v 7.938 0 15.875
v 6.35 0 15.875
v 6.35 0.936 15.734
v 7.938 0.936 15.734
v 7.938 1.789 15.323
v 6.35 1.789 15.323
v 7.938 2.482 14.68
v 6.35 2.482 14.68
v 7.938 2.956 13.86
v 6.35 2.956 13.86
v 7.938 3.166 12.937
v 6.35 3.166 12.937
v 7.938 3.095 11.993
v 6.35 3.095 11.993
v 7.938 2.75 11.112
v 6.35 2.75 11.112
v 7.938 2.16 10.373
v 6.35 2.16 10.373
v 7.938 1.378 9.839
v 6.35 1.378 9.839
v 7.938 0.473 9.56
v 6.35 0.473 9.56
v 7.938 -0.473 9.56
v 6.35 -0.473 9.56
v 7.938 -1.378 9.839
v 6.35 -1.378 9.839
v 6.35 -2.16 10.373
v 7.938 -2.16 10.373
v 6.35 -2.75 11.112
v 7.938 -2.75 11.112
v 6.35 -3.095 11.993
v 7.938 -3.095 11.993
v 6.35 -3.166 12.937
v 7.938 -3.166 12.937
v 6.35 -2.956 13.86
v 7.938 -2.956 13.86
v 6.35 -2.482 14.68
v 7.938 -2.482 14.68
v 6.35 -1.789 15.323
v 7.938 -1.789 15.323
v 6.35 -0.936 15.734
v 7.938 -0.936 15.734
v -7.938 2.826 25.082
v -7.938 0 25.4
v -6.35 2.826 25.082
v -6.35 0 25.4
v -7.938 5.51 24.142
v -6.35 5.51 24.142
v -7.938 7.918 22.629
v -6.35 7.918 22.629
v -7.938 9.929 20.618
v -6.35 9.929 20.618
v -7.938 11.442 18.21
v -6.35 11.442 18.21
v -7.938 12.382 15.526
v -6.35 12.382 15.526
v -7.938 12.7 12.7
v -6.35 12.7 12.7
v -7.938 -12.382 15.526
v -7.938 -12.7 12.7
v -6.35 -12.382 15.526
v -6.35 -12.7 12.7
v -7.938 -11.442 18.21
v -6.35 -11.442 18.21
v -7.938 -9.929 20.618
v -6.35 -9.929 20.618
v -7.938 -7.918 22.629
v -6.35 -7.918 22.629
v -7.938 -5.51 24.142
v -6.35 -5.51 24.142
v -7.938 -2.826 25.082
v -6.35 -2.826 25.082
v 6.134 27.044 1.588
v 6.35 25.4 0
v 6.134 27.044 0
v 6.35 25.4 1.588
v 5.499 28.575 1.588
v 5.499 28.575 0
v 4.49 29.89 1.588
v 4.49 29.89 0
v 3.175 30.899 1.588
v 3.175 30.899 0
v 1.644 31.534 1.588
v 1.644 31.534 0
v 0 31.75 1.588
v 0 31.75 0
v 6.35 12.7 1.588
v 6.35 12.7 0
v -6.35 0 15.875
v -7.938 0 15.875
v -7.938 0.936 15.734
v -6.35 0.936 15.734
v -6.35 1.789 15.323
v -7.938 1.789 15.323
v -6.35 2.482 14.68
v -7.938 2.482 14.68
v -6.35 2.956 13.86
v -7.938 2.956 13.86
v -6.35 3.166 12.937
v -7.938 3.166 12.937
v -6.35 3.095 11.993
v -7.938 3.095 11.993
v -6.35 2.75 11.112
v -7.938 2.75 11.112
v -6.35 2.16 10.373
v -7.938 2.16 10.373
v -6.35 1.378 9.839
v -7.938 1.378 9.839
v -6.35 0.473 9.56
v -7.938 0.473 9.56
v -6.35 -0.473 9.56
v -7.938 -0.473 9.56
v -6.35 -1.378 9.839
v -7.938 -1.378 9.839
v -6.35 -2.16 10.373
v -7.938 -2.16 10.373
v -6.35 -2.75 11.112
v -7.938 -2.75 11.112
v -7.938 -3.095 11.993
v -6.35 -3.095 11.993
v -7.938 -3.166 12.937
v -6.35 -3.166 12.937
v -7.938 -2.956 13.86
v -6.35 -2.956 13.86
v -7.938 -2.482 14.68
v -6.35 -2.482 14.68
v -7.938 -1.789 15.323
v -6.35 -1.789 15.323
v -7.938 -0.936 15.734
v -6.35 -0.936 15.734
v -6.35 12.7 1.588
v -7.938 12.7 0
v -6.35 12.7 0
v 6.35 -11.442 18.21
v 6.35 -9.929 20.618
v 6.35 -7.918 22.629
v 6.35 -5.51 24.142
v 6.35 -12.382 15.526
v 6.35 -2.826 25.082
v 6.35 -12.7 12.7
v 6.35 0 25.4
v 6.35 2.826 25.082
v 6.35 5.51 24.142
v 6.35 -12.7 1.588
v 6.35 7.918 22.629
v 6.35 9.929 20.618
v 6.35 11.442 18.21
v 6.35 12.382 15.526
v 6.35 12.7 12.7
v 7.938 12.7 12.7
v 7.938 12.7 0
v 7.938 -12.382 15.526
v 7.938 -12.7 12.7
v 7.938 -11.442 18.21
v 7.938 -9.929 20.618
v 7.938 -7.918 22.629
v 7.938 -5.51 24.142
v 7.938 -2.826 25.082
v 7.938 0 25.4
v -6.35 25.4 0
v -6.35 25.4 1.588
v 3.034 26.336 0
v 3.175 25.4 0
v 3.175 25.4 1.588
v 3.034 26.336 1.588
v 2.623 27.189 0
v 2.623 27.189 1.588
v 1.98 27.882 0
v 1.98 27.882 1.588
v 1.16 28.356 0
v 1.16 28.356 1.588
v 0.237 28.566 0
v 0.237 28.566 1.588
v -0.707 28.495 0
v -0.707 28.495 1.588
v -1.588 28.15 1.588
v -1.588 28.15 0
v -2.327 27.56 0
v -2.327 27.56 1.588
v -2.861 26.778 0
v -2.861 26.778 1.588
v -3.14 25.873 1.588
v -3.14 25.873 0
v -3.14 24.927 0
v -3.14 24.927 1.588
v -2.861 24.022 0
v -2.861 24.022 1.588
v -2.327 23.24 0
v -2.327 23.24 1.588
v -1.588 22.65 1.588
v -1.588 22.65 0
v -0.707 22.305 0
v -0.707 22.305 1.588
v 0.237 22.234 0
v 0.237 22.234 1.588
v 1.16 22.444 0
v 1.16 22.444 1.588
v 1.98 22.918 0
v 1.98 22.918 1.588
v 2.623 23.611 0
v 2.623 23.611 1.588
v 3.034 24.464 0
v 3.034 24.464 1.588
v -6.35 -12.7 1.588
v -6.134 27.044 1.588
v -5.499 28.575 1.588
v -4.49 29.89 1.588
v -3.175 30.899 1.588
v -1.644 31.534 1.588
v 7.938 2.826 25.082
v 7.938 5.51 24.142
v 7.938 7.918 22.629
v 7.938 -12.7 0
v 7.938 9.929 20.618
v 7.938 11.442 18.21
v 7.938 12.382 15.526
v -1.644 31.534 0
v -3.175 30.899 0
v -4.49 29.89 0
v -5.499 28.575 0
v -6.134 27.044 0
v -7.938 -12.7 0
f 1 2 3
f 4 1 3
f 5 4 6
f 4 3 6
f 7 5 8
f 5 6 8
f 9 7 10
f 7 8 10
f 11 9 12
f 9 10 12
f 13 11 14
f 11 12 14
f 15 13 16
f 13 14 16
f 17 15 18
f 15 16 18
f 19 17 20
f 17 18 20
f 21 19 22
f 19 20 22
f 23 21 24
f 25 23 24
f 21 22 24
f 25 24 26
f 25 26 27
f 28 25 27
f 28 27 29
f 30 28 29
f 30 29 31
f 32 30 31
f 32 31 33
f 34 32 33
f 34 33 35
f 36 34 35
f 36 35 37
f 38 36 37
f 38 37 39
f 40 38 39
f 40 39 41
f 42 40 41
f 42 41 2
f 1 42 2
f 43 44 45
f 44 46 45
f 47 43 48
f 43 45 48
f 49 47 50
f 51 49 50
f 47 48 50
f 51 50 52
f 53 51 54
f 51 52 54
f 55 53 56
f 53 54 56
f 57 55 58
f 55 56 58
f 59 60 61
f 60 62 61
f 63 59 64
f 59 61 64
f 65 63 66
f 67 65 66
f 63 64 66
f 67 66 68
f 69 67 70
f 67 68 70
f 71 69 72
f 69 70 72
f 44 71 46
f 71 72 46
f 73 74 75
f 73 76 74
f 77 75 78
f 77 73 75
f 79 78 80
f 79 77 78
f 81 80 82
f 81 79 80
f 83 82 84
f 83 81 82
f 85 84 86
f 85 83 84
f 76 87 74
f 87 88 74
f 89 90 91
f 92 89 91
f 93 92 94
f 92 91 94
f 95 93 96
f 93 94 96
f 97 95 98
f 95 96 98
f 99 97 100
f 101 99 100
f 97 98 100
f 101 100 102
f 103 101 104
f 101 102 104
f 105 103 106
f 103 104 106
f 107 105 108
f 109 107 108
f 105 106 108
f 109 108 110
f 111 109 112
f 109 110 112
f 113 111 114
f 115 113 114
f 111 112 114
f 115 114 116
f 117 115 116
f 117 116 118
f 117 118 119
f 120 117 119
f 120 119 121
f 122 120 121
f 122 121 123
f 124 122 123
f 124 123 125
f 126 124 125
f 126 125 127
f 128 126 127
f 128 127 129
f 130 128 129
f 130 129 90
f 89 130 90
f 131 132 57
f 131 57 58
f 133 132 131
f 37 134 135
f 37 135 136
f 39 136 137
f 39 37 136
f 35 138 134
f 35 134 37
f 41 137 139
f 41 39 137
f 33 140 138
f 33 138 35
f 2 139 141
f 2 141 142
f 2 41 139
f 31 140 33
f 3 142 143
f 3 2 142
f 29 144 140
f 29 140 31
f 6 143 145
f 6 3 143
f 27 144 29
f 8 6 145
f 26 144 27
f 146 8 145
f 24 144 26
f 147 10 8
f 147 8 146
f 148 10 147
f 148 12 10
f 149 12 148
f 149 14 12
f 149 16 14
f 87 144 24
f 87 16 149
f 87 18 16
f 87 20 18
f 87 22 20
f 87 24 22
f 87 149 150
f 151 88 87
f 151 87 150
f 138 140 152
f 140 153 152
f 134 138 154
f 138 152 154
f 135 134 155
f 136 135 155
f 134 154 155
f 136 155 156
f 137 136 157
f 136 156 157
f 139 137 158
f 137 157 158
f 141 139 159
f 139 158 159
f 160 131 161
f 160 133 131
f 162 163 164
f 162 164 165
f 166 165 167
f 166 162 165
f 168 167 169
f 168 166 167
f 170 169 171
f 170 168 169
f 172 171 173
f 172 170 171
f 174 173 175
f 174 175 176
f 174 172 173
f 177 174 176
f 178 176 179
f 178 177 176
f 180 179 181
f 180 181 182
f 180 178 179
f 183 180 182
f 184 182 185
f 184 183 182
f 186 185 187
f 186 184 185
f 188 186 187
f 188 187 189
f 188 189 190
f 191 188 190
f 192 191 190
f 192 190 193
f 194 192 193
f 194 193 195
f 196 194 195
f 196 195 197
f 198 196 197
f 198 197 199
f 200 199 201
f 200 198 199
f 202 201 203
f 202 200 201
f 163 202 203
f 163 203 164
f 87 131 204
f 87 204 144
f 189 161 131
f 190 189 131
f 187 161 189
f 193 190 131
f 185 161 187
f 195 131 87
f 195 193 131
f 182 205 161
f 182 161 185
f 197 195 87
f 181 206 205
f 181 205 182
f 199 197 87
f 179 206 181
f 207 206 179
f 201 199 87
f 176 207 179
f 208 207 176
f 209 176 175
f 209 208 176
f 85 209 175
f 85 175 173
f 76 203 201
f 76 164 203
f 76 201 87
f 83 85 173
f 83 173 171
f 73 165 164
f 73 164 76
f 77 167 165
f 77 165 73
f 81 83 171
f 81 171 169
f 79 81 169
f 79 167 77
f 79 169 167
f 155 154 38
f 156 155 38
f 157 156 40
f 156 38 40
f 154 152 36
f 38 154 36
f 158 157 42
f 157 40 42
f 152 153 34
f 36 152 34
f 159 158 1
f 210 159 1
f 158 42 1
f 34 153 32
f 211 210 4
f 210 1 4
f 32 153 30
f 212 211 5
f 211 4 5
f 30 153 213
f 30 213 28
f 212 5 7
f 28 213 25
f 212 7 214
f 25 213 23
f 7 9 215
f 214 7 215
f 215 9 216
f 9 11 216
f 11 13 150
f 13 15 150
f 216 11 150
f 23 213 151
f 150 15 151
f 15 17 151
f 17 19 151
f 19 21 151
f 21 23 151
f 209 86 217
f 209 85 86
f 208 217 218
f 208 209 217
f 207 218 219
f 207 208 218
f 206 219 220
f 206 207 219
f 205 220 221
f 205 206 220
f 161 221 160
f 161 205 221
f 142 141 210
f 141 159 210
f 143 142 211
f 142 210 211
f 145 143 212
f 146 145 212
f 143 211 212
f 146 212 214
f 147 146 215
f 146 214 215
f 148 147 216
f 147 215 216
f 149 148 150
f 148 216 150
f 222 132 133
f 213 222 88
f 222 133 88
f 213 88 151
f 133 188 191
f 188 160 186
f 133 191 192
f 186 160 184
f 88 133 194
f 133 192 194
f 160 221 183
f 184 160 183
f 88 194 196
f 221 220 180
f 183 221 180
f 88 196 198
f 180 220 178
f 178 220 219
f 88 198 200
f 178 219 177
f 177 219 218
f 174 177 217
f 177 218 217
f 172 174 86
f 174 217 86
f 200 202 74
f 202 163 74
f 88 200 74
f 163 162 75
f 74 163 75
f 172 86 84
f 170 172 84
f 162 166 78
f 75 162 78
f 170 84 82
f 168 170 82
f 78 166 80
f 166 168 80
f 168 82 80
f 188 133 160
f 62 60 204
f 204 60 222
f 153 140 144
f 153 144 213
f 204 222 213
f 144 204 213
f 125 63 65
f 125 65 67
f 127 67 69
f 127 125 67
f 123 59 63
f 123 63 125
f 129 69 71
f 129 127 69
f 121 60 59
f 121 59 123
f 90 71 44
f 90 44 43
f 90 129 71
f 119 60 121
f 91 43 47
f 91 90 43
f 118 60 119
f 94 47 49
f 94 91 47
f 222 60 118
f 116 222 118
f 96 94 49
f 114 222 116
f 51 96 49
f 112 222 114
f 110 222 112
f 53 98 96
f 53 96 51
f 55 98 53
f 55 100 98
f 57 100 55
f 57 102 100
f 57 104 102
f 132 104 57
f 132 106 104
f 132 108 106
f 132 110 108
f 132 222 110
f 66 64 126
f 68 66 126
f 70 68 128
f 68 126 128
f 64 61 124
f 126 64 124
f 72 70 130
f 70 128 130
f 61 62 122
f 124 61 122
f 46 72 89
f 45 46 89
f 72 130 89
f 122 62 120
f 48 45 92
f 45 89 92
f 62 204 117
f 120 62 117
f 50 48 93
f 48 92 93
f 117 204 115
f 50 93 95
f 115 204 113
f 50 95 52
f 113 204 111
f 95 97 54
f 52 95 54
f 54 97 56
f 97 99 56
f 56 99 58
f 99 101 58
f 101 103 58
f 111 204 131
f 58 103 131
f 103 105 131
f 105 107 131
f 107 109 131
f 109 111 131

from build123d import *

# Parameters (mm, degrees)
SKETCH1_W           = 12.7
SKETCH1_H           = 25.4
SKETCH1_H_2         = 19.05
SKETCH1_R           = 3.175
BOSS_EXTRUDE1_DEPTH = 1.5875
SKETCH1_3_W         = 1.5875
SKETCH1_3_H         = 25.4
BOSS_EXTRUDE2_DEPTH = 25.4
SKETCH2_R           = 3.175
CUT_EXTRUDE1_DEPTH  = 44.649033494
FILLET1_R           = 12.7
FILLET2_R           = 6.35


with BuildPart() as part:
    # Sketch1 → Boss-Extrude1 (new body)
    # profile 1 of 2: a face of its own
    with BuildSketch(Plane.XY):
        Rectangle(SKETCH1_W, SKETCH1_H)
    # profile 2 of 2: a face of its own
    with BuildSketch(Plane.XY):
        with Locations((0, 22.225)):
            Rectangle(SKETCH1_W, SKETCH1_H_2)
        with Locations((0, 25.4)):
            Circle(SKETCH1_R, mode=Mode.SUBTRACT)
    extrude(amount=BOSS_EXTRUDE1_DEPTH)

    # Sketch1<3> → Boss-Extrude2 (add)
    with BuildSketch(Plane.XY):
        with Locations((-7.14375, 0)):
            Rectangle(SKETCH1_3_W, SKETCH1_3_H)
        with Locations((7.14375, 0)):
            Rectangle(SKETCH1_3_W, SKETCH1_3_H)
    extrude(amount=BOSS_EXTRUDE2_DEPTH)

    # Sketch2 → Cut-Extrude1 (cut, through all)
    with BuildSketch(Plane.ZY.offset(7.9375)):
        with Locations((12.7, 0)):
            Circle(SKETCH2_R)
    extrude(amount=-CUT_EXTRUDE1_DEPTH, mode=Mode.SUBTRACT)

    # Fillet1
    fillet1_edges = [part.edges().sort_by_distance(p)[0] for p in [
        (-7.14375, -12.7, 25.4),
        (7.14375, -12.7, 25.4),
        (7.14375, 12.7, 25.4),
        (-7.14375, 12.7, 25.4),
    ]]
    fillet(fillet1_edges, radius=FILLET1_R - 0.0001)  # a hair under: the kernel refuses the full size

    # Fillet2
    fillet2_edges = [part.edges().sort_by_distance(p)[0] for p in [
        (-6.35, 31.75, 0.79375),
        (6.35, 31.75, 0.79375),
    ]]
    fillet(fillet2_edges, radius=FILLET2_R - 0.0001)  # a hair under: the kernel refuses the full size


solid = part.part
